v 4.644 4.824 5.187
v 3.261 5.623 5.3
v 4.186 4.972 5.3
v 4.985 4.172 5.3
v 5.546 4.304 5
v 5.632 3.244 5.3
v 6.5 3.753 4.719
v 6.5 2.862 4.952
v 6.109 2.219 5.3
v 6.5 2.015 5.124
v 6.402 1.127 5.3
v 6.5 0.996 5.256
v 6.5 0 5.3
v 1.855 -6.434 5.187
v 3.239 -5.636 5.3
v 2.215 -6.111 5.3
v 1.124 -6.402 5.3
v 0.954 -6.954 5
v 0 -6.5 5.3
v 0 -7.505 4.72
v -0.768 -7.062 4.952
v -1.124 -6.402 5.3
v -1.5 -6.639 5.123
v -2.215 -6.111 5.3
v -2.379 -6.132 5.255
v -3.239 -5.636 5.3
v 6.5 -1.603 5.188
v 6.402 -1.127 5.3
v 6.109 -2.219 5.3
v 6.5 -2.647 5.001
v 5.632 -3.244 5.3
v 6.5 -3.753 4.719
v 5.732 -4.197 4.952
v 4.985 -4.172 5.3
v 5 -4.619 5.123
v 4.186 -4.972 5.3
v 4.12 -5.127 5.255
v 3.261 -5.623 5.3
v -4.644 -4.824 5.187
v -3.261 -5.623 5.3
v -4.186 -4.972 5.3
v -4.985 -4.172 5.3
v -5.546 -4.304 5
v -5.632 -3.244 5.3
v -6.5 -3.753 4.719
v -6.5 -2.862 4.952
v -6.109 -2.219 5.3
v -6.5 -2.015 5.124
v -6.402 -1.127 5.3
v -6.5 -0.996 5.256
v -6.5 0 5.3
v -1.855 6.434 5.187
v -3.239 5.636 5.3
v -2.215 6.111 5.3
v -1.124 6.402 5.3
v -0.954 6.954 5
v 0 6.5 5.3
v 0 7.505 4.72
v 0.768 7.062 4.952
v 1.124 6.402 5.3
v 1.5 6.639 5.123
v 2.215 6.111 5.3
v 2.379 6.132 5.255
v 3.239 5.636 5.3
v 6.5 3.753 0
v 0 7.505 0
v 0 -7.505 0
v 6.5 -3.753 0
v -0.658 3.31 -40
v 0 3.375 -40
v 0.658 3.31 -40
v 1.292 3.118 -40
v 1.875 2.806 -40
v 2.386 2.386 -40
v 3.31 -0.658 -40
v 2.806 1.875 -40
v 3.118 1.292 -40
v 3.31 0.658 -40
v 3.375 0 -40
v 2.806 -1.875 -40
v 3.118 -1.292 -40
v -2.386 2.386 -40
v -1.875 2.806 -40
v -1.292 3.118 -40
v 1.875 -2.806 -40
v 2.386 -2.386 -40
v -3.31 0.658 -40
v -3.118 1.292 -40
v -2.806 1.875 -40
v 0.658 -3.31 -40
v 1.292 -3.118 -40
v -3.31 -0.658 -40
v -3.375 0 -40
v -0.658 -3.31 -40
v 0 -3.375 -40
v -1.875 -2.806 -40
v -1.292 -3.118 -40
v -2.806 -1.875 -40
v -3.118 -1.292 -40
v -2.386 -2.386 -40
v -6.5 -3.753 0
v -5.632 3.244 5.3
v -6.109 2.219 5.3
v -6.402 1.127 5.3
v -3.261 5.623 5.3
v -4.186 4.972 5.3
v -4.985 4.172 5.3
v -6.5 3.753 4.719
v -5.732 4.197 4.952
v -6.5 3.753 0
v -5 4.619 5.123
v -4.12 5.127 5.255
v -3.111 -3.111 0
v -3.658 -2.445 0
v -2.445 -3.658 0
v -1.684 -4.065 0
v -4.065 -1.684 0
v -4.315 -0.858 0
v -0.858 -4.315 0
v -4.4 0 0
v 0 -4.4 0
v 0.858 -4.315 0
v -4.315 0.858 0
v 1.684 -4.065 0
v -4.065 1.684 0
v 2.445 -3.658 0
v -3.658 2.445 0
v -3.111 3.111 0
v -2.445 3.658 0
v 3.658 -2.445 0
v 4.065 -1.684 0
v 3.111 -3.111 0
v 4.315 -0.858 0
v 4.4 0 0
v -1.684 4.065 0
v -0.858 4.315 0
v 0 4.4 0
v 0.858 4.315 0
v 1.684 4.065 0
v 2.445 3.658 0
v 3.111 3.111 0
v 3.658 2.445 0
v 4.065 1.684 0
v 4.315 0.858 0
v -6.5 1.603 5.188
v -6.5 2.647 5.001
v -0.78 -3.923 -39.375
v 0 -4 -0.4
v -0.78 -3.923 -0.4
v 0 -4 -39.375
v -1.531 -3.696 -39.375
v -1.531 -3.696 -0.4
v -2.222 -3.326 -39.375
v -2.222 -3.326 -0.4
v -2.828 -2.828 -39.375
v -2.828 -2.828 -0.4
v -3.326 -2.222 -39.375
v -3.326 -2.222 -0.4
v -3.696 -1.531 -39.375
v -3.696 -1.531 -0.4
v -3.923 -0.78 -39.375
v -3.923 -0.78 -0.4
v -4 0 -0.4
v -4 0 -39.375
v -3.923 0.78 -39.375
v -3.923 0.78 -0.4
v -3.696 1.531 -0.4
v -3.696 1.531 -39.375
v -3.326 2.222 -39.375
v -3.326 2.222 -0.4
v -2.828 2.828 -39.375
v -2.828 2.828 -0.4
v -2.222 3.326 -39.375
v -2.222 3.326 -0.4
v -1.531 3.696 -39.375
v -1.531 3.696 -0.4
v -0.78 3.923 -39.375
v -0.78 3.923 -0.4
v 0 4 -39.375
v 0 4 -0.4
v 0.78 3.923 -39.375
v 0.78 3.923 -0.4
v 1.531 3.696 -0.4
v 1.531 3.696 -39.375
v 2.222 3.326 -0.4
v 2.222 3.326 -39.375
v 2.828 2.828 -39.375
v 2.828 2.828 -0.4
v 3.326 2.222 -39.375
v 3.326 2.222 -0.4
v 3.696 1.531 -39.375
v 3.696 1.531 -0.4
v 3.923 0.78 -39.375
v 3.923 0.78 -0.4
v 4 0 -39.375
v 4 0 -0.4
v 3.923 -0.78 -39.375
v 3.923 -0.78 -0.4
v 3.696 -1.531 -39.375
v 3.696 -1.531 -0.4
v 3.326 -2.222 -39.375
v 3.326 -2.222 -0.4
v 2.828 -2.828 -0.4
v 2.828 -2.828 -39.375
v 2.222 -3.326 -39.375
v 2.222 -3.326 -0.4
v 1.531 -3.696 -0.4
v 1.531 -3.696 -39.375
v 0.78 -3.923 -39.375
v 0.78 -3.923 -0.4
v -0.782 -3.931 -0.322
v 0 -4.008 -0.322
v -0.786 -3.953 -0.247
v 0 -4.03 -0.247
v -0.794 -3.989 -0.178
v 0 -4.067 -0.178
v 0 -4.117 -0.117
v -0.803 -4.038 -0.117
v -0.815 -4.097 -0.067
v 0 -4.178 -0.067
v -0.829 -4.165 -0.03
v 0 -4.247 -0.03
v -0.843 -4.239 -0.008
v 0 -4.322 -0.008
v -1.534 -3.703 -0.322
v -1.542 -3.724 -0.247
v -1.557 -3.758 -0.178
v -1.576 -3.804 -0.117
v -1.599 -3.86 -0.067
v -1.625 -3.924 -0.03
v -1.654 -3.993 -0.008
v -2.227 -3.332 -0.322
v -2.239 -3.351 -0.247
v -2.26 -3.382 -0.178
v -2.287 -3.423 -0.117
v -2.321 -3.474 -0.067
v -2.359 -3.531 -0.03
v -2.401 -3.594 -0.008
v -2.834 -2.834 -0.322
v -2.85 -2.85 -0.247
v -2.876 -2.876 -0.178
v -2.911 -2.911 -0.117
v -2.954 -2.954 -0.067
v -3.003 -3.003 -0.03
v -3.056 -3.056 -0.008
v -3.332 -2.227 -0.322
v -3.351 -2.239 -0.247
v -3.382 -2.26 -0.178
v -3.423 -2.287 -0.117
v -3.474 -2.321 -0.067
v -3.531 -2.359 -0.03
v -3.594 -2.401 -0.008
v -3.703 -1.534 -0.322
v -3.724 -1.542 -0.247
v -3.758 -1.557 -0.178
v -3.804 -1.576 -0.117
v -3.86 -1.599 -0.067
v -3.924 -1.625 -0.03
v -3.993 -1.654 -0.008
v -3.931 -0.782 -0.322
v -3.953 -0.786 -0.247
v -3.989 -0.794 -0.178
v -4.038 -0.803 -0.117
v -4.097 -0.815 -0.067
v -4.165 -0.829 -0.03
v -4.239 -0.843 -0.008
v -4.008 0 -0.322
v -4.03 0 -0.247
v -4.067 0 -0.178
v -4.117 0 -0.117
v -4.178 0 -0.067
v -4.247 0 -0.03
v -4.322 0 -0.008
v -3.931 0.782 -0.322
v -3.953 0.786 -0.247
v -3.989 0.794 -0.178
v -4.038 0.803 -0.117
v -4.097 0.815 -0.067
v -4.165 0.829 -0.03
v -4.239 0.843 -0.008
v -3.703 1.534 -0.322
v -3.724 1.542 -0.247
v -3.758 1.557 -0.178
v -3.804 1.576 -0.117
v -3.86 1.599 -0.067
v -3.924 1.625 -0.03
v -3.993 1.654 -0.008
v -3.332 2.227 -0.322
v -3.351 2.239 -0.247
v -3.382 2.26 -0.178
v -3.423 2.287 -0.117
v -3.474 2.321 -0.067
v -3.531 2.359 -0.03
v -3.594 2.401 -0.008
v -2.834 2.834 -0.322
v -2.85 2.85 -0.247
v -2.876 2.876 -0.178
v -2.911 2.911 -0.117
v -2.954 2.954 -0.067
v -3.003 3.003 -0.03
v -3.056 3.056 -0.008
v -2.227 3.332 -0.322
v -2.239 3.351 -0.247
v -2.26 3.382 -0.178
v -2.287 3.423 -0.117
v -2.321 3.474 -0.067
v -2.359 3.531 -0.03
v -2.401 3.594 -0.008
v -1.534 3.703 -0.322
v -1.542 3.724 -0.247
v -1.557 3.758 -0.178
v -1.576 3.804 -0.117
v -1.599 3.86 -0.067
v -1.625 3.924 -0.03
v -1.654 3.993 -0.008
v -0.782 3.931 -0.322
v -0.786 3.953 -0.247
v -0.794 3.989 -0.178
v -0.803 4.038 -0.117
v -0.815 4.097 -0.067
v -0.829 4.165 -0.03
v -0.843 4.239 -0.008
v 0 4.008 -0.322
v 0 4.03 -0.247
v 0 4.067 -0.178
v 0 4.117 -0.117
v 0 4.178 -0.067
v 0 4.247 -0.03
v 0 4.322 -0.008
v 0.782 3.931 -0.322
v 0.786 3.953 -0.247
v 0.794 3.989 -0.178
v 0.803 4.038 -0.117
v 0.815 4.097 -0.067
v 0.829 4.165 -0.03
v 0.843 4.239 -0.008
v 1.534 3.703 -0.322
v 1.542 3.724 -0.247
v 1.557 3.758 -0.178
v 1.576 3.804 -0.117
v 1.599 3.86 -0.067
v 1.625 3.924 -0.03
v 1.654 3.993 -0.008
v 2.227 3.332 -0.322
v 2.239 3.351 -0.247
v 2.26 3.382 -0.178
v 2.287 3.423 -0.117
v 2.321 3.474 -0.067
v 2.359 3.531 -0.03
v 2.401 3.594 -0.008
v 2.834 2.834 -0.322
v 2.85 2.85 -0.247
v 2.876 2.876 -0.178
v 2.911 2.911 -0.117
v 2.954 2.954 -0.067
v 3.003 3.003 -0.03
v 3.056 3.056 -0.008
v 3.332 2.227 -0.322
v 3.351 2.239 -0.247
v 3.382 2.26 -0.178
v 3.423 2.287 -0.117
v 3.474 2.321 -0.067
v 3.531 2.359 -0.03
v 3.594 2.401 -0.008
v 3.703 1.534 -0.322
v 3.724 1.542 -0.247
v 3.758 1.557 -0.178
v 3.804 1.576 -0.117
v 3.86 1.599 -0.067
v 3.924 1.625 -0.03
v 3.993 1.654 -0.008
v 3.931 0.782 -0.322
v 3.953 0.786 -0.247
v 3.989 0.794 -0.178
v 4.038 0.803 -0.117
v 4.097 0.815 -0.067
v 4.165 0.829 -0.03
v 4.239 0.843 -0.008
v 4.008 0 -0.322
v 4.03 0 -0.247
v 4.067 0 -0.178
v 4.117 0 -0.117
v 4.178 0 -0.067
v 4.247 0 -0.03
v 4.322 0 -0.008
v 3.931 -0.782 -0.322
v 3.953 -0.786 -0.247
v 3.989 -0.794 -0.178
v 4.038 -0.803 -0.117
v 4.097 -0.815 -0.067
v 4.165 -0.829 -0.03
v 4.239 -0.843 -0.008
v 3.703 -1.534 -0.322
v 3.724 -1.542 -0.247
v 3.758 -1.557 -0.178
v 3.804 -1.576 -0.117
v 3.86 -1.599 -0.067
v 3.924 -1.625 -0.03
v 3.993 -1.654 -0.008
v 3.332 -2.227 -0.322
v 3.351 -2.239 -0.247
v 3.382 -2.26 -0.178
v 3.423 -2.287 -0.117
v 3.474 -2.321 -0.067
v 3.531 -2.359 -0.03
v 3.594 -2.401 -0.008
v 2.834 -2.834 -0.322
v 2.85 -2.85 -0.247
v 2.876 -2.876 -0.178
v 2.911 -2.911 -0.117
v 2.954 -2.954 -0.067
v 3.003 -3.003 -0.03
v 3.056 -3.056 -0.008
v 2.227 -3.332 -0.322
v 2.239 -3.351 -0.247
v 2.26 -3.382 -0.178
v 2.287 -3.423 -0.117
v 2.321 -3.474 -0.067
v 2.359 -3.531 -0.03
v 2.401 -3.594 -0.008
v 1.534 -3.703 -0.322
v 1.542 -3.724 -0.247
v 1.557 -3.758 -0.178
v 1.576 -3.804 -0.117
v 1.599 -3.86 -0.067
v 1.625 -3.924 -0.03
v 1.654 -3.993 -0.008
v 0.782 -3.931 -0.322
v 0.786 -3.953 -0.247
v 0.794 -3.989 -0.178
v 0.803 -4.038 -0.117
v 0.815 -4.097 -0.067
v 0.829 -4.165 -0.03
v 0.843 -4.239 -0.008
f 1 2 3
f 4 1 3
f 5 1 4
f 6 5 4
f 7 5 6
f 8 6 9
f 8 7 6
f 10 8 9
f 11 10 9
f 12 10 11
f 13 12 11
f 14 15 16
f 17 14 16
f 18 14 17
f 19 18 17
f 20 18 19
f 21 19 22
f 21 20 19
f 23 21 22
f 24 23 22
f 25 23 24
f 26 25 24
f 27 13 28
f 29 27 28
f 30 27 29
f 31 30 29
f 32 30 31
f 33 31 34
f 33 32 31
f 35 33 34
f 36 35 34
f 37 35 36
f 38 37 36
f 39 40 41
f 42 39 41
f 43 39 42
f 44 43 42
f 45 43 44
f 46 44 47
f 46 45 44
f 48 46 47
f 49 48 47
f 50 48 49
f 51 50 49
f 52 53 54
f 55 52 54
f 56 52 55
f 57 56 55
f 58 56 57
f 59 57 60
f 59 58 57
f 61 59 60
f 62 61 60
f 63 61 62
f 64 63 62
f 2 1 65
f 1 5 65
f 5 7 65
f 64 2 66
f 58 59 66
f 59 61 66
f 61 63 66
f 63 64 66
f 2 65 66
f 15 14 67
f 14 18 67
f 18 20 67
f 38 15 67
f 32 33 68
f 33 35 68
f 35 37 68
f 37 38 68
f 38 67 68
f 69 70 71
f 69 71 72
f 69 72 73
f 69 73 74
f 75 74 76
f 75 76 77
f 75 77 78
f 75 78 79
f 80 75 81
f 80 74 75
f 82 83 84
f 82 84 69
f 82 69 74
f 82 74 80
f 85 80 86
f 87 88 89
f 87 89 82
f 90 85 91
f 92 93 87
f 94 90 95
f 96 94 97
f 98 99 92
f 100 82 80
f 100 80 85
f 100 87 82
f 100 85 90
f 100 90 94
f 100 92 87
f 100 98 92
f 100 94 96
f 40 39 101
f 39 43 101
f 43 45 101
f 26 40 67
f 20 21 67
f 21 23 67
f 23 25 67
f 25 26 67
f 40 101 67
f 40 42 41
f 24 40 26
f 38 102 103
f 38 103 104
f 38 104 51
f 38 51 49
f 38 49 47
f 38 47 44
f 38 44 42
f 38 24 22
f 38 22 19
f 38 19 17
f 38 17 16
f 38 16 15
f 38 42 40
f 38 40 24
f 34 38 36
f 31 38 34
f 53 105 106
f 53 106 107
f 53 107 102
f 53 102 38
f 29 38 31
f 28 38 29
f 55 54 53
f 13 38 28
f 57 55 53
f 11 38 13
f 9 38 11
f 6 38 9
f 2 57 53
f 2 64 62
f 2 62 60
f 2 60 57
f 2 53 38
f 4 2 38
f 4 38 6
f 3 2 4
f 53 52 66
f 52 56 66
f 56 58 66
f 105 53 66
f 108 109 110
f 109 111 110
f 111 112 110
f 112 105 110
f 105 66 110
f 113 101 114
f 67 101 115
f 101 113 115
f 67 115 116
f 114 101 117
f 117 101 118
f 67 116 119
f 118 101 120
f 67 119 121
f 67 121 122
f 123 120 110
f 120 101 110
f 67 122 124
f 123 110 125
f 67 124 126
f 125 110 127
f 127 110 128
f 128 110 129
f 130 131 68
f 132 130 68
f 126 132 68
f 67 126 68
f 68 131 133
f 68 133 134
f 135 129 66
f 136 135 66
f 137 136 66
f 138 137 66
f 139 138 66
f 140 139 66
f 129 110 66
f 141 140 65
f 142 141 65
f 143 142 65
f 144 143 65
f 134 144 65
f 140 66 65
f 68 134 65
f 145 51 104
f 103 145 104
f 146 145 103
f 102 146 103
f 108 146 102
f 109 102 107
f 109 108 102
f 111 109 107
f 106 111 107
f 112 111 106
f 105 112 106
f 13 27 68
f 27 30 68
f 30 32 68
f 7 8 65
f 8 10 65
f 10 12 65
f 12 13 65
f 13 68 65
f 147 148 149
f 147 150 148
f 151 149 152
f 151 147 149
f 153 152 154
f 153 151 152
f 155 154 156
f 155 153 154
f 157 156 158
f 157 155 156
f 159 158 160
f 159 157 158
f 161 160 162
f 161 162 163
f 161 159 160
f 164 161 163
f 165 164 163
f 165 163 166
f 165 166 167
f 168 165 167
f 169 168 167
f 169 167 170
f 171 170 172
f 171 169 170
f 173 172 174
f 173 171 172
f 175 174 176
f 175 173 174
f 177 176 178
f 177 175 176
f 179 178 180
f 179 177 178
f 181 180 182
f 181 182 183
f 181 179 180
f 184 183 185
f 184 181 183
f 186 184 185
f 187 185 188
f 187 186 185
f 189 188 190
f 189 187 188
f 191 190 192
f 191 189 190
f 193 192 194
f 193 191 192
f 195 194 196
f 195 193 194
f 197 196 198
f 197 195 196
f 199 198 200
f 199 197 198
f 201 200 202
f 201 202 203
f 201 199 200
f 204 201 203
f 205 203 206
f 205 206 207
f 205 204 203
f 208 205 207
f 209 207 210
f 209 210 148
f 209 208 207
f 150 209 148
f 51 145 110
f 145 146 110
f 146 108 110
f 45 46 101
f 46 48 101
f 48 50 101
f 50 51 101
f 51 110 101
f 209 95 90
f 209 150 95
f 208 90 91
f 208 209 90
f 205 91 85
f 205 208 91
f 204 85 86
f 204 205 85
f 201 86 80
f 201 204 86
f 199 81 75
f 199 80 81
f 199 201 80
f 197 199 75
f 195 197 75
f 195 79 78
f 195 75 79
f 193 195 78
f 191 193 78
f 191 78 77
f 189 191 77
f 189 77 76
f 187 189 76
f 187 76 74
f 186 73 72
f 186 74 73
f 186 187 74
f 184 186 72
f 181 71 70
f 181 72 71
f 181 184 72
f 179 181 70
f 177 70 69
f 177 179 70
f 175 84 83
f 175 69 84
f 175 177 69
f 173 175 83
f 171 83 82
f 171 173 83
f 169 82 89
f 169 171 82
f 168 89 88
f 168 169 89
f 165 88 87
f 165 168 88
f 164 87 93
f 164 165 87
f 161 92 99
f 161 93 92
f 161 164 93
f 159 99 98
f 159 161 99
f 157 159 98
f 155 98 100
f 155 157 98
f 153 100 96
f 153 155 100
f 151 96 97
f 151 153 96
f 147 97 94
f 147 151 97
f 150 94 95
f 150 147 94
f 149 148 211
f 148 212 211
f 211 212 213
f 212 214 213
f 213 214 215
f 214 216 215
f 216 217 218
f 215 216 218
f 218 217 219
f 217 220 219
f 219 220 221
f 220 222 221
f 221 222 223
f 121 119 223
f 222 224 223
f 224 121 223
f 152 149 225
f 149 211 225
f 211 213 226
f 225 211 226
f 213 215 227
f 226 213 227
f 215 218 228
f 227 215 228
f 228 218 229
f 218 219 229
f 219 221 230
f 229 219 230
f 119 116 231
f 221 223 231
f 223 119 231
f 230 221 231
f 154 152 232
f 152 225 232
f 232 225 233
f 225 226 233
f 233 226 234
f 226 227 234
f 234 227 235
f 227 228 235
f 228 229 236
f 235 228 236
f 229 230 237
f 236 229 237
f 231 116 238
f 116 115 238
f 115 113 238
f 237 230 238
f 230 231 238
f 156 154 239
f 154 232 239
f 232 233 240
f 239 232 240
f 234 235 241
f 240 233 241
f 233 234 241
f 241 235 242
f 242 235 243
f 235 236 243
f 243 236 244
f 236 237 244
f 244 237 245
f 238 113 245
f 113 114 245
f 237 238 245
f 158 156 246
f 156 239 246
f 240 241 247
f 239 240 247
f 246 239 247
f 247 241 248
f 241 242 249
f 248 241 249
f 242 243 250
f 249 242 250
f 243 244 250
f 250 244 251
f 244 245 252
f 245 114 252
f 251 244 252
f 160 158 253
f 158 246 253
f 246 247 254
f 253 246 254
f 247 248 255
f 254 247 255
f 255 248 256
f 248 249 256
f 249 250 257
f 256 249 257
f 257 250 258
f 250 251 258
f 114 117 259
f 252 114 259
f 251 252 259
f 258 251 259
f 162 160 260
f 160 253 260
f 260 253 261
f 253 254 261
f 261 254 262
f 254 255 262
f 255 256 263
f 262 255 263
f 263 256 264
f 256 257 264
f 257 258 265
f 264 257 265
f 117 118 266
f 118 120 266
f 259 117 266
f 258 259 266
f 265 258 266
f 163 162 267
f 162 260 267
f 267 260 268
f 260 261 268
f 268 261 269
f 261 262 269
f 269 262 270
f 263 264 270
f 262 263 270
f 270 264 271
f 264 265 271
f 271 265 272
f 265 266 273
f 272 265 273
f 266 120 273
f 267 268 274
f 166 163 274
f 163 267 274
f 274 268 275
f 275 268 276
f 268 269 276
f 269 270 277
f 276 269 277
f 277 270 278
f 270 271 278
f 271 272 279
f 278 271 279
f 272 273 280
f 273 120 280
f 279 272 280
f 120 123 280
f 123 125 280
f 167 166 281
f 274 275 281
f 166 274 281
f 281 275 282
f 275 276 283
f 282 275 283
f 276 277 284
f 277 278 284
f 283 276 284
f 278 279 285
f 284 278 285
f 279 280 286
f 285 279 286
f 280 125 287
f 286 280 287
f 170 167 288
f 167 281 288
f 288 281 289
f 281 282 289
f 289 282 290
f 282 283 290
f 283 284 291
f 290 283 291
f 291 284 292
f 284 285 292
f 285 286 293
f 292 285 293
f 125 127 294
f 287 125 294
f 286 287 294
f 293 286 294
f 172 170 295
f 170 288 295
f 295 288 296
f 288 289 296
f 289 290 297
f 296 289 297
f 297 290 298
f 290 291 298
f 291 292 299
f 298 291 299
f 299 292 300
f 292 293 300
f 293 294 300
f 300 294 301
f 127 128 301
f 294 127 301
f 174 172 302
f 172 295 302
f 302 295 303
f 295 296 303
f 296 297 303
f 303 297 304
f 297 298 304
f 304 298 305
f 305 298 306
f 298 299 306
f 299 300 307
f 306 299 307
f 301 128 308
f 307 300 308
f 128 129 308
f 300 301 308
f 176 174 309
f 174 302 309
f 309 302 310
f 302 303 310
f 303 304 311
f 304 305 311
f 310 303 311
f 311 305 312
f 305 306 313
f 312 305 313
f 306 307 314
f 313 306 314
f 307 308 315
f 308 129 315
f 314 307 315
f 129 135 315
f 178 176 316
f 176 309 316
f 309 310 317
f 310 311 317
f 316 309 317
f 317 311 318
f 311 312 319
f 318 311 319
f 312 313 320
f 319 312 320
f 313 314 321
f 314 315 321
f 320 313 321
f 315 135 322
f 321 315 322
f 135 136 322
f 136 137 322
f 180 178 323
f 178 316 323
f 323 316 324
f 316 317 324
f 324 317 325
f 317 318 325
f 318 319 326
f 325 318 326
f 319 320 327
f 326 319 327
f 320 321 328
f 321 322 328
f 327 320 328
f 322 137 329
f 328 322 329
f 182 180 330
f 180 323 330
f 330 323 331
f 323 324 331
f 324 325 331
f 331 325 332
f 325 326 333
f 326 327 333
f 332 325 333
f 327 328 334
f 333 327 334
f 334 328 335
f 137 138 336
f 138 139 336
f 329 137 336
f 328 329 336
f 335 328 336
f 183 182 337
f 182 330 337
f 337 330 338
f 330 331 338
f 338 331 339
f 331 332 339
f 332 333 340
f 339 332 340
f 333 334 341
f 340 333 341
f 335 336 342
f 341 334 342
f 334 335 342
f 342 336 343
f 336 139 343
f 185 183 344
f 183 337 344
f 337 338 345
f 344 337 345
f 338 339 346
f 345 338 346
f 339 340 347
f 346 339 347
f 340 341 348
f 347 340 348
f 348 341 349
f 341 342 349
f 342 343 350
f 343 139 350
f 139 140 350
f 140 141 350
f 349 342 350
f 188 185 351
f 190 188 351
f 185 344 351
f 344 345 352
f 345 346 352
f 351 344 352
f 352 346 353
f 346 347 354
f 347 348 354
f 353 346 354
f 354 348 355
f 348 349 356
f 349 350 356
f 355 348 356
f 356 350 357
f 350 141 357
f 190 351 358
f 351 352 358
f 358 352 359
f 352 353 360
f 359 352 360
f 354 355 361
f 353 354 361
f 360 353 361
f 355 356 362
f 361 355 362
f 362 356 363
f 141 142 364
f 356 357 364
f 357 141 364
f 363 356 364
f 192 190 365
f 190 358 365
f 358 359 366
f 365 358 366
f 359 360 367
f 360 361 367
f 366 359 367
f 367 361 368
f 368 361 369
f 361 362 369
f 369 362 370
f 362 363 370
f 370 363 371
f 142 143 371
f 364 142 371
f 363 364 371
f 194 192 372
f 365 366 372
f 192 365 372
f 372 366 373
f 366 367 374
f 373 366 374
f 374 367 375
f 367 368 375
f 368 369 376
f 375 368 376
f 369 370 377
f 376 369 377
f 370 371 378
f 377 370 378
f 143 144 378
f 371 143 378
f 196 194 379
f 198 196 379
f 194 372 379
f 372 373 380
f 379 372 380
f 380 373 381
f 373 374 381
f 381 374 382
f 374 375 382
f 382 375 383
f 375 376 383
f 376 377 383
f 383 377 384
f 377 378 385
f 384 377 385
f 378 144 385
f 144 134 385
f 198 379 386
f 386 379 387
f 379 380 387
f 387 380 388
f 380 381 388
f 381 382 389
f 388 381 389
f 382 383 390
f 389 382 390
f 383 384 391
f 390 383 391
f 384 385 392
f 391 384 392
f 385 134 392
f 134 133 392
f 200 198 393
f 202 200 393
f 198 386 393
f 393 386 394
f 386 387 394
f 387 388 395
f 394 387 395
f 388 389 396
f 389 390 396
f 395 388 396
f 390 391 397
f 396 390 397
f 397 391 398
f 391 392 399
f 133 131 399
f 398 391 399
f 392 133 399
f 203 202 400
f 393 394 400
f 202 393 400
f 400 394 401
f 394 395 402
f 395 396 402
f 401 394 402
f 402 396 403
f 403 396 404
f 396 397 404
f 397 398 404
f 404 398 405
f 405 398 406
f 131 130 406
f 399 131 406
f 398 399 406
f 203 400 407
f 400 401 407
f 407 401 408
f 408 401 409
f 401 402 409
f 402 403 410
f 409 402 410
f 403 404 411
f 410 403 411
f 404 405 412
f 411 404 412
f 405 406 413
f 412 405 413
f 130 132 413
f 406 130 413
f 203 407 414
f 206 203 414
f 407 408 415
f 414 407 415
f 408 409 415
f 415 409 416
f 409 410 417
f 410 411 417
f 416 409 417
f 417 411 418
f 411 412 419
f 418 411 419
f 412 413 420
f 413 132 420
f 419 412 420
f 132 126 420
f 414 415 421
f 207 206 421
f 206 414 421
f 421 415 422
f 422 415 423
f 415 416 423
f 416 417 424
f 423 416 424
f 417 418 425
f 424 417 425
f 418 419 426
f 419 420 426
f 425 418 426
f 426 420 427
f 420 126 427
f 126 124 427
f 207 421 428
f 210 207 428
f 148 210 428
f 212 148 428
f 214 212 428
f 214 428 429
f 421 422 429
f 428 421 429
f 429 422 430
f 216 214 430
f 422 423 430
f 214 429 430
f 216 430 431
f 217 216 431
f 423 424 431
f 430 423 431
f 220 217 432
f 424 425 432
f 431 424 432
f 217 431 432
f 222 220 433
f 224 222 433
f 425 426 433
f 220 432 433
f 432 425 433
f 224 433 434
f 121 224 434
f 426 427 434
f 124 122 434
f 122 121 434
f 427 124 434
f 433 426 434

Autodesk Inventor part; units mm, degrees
ref_plane "WorkPlane1" through (0, 0, 0) normal (0, 0, 1) x (1, 0, 0)
sketch "Sketch1" plane through (0, 0, 0) normal (0, 0, 1) x (1, 0, 0)
  point P0 (0, 0)
sketch "Sketch2" plane through (0, 0, 0) normal (0, 0, 1) x (1, 0, 0)
  line L0 (-6.5, 3.7529) -> (-6.5, -3.7529)
  line L1 (0, 7.5054) -> (-6.5, 3.7529)
  line L2 (6.5, 3.7529) -> (0, 7.5054)
  line L3 (6.5, -3.7529) -> (6.5, 3.7529)
  line L4 (0, -7.5054) -> (6.5, -3.7529)
  line L5 (-6.5, -3.7529) -> (0, -7.5054)
  circle A0 centre (0, 0) radius 6.5 construction
  dimension "d1" = 13
  dimension "d29" = 0
  dimension "d30" = 0
extrude "Extrusion1" add sketch "Sketch2" along normal blind 5.3
sketch "Sketch3" plane through (0, 0, 0) normal (1, 0, 0) x (0, 1, 0)
  line L0 (6.5, 5.3) -> (7.6054, 5.3)
  line L1 (7.6054, 4.6618) -> (6.5, 5.3)
  line L2 (7.6054, 5.3) -> (7.6054, 4.6618)
  line L3 (0, -1.06) -> (0, 6.36) projected
  line L4 (7.5054, 0) -> (7.5054, 5.3) projected
  dimension "d25" = 0.1
  dimension "d26" = 0
  dimension "d27" = 60
  dimension "d28" = 6.5
revolve "Revolution1" cut sketch "Sketch3" angle 360 about axis through (0, 0, -10) along (0, 0, 1)
sketch "Sketch4" plane through (0, 0, 0) normal (1, 0, 0) x (0, 1, 0)
  line L0 (0, -40) -> (0, 0)
  line L1 (-4, -40) -> (0, -40)
  line L2 (-4, 0) -> (-4, -40)
  line L3 (0, 0) -> (-4, 0)
  line L4 (0, -40) -> (0, 0)
  line L5 (-4.8, 0) -> (0.8, 0) projected
  line L6 (0, -48) -> (0, 8) projected
  dimension "d18" = 4
  dimension "d20" = 40
  dimension "d33" = 0
  dimension "d34" = 0
revolve "Revolution2" add sketch "Sketch4" angle 360 about axis through (0, 0, -40) along (0, 0, -1)
chamfer "Chamfer1" distance 0.625 angle 45 1 edges at (0, 4, -40)
fillet "Fillet1" radius 0.4 1 edges at (0, 4, 0)
thread "Thread1" size "M8x1.25" class "6g" standard "ISO Metric profile" length 37.5
ref_plane "MSC_PF1" through (0, 0, 0) normal (1, 0, 0) x (0, 1, 0)
ref_plane "MSC_PT1" through (0, 0, 0) normal (0, 0, -1) x (-1, 0, 0)
equation "\"d22\" = 0.5 * PTC"
equation "\"d23\" = 0.5 * PTC"
equation "\"d24\" = r"
equation "\"d1\" = ParS"
equation "\"d6\" = ParK"
equation "\"b\" = NLG - 2 * PTC"
equation "\"d28\" = 0.5 * ParS"
equation "\"d18\" = 0.5 * NND"
equation "\"d20\" = NLG"
equation "\"NND\" = 8"
equation "\"NLG\" = 40"
equation "\"PTC\" = 1.25"
equation "\"ParK\" = 5.3"
equation "\"ParS\" = 13"
equation "\"msp_es\" = 0.577367 * ParS"
equation "\"r\" = 0.4"
equation "\"THREADDIA\" = NND"
properties part number "ISO 4018 - M8 x 40(1)" material "Steel"
